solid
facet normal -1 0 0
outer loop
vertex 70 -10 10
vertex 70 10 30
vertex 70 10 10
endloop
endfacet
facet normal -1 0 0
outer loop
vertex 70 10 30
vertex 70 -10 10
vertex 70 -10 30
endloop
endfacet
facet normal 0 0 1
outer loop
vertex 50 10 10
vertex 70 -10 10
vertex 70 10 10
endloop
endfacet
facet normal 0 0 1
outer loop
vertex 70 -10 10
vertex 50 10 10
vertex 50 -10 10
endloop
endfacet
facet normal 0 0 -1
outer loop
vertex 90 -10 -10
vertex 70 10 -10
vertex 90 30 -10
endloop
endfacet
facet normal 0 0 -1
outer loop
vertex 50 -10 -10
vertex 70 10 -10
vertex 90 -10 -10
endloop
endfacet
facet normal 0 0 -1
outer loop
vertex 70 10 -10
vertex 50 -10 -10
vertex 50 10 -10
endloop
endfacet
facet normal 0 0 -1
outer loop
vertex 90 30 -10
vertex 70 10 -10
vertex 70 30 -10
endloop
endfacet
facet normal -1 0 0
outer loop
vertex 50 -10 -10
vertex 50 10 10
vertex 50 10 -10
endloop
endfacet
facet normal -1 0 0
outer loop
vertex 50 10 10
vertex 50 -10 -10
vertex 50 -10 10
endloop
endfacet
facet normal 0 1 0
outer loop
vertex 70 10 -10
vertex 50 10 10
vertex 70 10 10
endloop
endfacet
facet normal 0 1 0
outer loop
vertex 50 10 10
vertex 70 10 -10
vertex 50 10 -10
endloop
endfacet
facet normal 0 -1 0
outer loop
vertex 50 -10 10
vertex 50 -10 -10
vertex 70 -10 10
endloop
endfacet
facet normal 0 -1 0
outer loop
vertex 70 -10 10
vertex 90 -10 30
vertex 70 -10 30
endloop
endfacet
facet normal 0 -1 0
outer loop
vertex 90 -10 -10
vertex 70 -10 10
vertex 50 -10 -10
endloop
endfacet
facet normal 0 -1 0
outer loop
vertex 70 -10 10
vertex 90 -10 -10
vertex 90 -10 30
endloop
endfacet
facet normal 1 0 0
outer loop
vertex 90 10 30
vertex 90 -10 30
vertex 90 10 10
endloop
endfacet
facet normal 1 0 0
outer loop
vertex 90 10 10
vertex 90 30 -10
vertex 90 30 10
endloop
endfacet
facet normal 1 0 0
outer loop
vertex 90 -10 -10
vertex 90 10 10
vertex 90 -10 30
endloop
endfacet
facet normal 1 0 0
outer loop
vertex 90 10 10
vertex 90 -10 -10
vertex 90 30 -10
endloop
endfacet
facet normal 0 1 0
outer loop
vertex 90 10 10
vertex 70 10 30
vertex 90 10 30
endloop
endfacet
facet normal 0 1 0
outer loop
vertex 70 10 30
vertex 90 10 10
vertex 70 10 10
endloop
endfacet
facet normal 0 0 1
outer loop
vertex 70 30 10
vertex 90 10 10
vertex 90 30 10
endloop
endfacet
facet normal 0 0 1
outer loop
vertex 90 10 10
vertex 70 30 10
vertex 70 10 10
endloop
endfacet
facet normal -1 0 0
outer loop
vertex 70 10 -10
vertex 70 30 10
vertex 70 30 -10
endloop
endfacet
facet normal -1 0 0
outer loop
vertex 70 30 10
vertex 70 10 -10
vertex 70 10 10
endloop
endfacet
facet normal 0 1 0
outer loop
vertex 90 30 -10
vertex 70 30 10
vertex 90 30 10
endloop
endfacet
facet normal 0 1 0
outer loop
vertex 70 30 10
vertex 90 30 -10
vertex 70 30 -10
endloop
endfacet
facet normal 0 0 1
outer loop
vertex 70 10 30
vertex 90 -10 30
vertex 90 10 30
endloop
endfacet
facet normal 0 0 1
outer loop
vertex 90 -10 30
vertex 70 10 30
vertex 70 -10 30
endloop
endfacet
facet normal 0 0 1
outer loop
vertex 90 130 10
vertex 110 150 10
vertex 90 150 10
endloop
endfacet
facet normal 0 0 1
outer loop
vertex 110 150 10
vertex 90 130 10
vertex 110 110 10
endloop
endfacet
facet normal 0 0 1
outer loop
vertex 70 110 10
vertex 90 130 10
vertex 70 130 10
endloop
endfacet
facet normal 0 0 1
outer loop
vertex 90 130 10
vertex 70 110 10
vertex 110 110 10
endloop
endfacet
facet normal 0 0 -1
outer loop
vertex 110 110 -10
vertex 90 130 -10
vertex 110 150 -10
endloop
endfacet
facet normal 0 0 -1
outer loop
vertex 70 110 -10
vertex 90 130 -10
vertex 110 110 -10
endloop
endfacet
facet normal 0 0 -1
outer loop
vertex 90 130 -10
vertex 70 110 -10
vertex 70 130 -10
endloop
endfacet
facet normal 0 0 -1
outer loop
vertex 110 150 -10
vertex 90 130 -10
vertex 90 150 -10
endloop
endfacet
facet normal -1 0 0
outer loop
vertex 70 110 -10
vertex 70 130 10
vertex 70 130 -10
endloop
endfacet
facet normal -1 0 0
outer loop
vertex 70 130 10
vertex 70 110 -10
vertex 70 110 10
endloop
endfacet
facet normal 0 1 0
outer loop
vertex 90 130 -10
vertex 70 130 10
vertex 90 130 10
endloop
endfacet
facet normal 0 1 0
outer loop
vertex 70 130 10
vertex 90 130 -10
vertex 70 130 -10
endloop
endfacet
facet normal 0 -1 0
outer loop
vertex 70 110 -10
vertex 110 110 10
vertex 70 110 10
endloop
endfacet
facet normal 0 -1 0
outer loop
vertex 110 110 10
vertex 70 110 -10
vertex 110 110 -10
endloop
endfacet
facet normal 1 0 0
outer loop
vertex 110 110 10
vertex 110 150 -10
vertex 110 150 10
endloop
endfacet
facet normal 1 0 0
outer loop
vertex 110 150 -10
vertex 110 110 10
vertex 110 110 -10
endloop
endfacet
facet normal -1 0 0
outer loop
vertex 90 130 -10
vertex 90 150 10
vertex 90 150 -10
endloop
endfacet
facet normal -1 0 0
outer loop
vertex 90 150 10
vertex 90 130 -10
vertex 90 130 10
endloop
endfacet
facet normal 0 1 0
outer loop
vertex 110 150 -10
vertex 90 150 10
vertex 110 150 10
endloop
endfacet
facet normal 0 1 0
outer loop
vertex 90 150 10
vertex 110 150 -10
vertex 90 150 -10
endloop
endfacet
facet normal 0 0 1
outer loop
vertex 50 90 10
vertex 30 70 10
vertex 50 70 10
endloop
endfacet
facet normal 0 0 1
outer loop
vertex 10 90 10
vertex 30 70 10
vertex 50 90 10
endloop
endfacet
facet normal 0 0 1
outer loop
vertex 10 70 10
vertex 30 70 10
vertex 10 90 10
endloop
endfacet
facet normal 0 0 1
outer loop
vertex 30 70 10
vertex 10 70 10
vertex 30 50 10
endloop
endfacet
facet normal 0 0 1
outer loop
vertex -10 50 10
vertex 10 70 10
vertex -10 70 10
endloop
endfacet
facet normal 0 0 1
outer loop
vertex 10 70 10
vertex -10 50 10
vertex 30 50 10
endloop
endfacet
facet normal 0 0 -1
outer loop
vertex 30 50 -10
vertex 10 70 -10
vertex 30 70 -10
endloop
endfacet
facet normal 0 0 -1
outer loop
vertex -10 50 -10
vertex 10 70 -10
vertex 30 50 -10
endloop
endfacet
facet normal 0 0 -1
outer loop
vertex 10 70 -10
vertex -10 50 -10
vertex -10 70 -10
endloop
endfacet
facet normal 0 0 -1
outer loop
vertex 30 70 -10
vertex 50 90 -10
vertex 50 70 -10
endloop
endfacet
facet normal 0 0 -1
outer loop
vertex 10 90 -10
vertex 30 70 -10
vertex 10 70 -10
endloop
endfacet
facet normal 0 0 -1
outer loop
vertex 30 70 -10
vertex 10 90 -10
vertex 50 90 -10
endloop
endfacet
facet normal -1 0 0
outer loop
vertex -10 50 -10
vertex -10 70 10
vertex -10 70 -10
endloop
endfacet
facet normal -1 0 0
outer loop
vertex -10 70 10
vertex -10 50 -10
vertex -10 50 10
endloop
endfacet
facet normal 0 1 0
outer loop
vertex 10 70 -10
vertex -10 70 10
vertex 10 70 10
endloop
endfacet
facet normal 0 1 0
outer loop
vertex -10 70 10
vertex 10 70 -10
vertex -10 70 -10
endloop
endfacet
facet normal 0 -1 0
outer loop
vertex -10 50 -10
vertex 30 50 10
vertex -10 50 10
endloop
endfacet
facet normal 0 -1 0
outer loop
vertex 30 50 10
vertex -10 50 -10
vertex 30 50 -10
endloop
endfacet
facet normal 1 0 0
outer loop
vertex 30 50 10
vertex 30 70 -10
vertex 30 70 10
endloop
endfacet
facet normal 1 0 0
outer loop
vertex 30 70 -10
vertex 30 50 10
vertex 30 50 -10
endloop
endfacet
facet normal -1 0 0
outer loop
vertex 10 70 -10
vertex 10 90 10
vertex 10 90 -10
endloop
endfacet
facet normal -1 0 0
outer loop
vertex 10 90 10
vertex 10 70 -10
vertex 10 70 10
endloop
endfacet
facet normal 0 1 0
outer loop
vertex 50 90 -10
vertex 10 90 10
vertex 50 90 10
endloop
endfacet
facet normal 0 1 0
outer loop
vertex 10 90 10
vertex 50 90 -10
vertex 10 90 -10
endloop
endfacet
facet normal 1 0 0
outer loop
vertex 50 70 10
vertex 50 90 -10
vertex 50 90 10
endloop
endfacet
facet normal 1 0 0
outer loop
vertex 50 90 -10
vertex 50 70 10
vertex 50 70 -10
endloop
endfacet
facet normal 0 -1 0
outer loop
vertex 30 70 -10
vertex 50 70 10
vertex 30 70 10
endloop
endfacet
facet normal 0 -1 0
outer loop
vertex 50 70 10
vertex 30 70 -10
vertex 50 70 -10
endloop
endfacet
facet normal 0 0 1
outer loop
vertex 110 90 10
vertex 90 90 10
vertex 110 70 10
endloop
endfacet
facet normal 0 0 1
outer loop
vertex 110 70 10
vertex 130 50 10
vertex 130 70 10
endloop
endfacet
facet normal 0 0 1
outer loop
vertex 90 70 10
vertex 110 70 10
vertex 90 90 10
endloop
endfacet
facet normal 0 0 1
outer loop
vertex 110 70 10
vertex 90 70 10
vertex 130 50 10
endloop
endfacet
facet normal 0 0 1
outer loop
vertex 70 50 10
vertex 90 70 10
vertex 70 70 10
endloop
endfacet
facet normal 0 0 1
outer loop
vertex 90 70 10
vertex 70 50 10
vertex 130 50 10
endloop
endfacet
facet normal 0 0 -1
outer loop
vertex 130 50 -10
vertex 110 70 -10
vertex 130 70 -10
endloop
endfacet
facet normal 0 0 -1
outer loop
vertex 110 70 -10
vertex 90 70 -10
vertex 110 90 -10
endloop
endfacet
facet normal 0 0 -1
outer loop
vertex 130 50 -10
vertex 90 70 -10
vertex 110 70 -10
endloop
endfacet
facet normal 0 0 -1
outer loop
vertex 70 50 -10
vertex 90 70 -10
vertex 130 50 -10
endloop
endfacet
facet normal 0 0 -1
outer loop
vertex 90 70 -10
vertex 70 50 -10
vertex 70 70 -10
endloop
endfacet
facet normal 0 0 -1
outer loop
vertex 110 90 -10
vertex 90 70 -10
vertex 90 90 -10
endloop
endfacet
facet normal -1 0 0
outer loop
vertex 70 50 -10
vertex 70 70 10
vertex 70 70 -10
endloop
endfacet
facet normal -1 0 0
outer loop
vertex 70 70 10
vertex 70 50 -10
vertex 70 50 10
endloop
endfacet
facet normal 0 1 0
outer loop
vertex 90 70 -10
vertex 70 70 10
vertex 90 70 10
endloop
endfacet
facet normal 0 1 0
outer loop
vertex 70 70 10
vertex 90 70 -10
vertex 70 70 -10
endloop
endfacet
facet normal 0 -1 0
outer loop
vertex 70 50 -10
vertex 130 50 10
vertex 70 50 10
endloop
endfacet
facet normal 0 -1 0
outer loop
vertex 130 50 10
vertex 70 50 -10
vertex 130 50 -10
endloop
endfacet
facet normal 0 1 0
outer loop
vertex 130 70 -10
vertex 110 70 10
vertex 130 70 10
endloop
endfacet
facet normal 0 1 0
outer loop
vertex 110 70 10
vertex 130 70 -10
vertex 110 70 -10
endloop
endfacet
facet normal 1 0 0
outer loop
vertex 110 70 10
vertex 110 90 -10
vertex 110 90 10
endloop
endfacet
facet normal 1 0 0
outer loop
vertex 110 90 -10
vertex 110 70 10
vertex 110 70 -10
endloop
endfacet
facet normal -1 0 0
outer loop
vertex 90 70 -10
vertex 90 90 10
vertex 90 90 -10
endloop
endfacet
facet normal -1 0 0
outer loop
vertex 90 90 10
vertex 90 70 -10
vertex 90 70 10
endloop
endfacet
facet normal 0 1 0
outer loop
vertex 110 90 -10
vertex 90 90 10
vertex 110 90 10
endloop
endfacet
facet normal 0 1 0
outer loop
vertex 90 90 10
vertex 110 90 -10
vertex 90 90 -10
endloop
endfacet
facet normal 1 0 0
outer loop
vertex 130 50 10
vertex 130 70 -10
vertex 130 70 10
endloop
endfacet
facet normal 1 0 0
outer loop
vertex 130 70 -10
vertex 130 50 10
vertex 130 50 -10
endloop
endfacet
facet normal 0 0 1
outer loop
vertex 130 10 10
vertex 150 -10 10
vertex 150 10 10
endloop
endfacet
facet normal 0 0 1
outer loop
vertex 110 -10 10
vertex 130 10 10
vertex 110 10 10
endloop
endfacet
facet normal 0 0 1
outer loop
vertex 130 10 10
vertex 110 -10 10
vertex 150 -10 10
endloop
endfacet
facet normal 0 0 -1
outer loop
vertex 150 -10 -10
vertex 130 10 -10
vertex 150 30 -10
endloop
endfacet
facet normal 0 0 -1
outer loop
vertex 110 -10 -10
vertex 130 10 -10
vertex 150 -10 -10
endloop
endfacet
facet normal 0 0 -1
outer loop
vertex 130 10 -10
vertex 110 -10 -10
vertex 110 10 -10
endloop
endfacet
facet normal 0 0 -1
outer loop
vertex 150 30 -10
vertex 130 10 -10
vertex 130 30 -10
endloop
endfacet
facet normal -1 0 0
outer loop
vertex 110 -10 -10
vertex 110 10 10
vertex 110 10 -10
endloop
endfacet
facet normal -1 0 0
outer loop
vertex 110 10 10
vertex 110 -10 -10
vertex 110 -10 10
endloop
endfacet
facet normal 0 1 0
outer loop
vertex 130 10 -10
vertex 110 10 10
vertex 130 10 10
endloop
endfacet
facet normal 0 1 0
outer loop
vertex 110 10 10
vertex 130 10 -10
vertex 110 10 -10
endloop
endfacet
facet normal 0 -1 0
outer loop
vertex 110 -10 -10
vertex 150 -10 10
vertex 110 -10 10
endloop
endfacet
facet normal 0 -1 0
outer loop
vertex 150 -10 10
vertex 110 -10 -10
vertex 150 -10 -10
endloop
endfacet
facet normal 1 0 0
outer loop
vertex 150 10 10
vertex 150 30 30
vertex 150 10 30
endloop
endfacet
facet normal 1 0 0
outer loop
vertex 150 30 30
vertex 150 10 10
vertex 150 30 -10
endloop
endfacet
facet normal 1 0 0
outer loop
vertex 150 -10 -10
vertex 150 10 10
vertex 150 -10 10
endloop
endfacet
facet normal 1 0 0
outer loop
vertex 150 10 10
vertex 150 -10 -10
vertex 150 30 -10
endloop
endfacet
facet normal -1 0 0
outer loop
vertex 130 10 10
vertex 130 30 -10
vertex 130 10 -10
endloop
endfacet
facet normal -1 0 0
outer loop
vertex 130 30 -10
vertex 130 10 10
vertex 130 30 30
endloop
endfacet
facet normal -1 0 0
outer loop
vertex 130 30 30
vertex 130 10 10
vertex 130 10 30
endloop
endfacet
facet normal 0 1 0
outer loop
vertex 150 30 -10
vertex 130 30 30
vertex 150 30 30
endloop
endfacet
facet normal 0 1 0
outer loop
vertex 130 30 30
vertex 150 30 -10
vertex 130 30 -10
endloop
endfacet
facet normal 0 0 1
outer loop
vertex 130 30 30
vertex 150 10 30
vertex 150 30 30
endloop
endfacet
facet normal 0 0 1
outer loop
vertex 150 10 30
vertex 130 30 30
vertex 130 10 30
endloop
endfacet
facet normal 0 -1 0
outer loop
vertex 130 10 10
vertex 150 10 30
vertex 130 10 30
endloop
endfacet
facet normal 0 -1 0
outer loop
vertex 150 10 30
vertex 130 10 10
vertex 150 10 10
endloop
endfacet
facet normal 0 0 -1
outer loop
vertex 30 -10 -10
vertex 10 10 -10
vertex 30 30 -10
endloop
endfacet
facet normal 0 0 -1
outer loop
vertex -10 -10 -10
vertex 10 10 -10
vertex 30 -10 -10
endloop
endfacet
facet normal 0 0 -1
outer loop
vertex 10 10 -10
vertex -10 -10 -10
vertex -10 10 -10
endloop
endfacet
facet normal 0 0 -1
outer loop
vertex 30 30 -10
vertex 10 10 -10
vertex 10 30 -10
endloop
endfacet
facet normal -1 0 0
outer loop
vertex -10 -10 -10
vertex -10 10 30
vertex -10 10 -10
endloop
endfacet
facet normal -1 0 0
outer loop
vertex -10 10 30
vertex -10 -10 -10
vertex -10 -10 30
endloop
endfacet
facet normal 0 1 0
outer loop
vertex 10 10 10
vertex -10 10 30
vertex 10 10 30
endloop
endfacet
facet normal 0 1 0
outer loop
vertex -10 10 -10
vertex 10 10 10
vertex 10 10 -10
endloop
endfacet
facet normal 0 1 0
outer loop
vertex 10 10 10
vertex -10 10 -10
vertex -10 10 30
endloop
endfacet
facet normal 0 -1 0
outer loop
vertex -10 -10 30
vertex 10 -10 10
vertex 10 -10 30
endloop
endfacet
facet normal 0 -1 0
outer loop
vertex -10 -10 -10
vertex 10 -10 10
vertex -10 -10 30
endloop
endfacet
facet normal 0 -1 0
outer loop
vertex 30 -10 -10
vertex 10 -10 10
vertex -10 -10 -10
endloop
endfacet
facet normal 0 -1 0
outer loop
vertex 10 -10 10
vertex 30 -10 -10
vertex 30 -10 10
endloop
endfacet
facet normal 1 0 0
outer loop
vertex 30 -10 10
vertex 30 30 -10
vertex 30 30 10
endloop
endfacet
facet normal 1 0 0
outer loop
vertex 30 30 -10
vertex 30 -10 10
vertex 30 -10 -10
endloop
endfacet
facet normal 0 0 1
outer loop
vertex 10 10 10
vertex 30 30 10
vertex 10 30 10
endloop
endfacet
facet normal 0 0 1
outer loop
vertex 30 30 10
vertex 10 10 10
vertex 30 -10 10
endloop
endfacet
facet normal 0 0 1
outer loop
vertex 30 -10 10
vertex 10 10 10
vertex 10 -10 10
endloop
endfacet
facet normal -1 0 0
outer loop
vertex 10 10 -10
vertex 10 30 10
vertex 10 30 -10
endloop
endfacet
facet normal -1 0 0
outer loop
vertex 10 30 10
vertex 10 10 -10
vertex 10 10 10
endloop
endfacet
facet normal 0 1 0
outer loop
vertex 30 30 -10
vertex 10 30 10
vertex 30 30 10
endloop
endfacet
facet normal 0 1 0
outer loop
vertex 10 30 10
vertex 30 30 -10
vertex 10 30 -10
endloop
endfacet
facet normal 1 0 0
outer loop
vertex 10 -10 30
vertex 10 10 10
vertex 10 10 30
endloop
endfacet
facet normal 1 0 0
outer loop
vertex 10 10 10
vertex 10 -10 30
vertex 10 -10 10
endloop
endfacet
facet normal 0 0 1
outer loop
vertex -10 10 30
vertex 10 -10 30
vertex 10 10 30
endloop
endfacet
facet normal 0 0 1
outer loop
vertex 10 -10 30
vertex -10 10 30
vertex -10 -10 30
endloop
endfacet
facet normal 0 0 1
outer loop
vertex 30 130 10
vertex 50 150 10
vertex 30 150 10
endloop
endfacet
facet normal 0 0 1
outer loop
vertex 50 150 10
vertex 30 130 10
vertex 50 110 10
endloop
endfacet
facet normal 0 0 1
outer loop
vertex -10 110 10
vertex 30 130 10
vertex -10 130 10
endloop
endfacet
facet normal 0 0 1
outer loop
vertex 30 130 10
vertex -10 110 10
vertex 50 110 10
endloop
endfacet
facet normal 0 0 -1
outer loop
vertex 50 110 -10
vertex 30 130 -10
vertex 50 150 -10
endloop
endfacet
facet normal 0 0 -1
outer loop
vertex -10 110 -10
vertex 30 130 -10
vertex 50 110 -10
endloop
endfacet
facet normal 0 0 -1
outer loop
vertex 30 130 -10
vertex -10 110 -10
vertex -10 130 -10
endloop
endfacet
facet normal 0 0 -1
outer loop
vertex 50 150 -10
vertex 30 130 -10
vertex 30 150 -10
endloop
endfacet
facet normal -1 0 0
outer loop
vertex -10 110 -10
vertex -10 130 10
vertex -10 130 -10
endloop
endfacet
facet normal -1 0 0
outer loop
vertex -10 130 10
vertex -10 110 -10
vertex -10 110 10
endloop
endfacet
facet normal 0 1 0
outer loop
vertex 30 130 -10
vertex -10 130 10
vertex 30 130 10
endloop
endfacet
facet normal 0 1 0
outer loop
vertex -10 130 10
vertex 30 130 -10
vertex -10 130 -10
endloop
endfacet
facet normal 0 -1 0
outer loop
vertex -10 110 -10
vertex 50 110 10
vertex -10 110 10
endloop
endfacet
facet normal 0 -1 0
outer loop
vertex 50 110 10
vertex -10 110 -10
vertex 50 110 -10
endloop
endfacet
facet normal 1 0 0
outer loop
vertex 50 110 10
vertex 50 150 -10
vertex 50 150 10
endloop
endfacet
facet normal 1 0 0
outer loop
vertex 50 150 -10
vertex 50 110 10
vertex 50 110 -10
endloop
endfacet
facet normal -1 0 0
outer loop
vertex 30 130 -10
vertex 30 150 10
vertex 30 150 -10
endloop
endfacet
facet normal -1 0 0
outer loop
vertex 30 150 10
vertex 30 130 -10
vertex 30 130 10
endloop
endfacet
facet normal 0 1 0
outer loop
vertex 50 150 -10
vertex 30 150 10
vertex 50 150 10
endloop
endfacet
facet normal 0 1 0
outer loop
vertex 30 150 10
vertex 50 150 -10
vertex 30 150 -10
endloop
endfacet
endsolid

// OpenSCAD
// Length of a cube side
side = 20;

module c()
{
  cube(size=side, center=true);
}


$fn = 100;

module c1()
{
  union()
  {
    c();
    translate([side,0,0]) c();
    translate([side,side,0]) c();
    translate([side,0,side]) c();
  }
}


module c2()
{
  union()
  {
    c();
    translate([side,0,0]) c();
    translate([side,side,0]) c();
  }
}


module c3()
{
  union()
  {
    c();
    translate([side,0,0]) c();
    translate([side,side,0]) c();
    translate([2 * side,side,0]) c();
  }
}


module c4()
{
  union()
  {
    c();
    translate([side,0,0]) c();
    translate([side,side,0]) c();
    translate([2 * side,0,0]) c();
  }
}


module c5()
{
  union()
  {
    c();
    translate([side,0,0]) c();
    translate([side,side,0]) c();
    translate([side,side,side]) c();
  }
}


module c6()
{
  union()
  {
    c();
    translate([side,0,0]) c();
    translate([side,side,0]) c();
    translate([0,0,side]) c();
  }
}


module c7()
{
  union()
  {
    c();
    translate([side,0,0]) c();
    translate([2 * side,side,0]) c();
    translate([2 * side,0,0]) c();
  }
}

translate([3 * side,0,0]) c1();
translate([4 * side,6 * side,0]) c2();
translate([0,3 * side,0]) c3();
translate([4 * side,3 * side,0]) c4();
translate([6 * side,0,0]) c5();
translate([0,0,0]) c6();
translate([0,6 * side,0]) c7();
